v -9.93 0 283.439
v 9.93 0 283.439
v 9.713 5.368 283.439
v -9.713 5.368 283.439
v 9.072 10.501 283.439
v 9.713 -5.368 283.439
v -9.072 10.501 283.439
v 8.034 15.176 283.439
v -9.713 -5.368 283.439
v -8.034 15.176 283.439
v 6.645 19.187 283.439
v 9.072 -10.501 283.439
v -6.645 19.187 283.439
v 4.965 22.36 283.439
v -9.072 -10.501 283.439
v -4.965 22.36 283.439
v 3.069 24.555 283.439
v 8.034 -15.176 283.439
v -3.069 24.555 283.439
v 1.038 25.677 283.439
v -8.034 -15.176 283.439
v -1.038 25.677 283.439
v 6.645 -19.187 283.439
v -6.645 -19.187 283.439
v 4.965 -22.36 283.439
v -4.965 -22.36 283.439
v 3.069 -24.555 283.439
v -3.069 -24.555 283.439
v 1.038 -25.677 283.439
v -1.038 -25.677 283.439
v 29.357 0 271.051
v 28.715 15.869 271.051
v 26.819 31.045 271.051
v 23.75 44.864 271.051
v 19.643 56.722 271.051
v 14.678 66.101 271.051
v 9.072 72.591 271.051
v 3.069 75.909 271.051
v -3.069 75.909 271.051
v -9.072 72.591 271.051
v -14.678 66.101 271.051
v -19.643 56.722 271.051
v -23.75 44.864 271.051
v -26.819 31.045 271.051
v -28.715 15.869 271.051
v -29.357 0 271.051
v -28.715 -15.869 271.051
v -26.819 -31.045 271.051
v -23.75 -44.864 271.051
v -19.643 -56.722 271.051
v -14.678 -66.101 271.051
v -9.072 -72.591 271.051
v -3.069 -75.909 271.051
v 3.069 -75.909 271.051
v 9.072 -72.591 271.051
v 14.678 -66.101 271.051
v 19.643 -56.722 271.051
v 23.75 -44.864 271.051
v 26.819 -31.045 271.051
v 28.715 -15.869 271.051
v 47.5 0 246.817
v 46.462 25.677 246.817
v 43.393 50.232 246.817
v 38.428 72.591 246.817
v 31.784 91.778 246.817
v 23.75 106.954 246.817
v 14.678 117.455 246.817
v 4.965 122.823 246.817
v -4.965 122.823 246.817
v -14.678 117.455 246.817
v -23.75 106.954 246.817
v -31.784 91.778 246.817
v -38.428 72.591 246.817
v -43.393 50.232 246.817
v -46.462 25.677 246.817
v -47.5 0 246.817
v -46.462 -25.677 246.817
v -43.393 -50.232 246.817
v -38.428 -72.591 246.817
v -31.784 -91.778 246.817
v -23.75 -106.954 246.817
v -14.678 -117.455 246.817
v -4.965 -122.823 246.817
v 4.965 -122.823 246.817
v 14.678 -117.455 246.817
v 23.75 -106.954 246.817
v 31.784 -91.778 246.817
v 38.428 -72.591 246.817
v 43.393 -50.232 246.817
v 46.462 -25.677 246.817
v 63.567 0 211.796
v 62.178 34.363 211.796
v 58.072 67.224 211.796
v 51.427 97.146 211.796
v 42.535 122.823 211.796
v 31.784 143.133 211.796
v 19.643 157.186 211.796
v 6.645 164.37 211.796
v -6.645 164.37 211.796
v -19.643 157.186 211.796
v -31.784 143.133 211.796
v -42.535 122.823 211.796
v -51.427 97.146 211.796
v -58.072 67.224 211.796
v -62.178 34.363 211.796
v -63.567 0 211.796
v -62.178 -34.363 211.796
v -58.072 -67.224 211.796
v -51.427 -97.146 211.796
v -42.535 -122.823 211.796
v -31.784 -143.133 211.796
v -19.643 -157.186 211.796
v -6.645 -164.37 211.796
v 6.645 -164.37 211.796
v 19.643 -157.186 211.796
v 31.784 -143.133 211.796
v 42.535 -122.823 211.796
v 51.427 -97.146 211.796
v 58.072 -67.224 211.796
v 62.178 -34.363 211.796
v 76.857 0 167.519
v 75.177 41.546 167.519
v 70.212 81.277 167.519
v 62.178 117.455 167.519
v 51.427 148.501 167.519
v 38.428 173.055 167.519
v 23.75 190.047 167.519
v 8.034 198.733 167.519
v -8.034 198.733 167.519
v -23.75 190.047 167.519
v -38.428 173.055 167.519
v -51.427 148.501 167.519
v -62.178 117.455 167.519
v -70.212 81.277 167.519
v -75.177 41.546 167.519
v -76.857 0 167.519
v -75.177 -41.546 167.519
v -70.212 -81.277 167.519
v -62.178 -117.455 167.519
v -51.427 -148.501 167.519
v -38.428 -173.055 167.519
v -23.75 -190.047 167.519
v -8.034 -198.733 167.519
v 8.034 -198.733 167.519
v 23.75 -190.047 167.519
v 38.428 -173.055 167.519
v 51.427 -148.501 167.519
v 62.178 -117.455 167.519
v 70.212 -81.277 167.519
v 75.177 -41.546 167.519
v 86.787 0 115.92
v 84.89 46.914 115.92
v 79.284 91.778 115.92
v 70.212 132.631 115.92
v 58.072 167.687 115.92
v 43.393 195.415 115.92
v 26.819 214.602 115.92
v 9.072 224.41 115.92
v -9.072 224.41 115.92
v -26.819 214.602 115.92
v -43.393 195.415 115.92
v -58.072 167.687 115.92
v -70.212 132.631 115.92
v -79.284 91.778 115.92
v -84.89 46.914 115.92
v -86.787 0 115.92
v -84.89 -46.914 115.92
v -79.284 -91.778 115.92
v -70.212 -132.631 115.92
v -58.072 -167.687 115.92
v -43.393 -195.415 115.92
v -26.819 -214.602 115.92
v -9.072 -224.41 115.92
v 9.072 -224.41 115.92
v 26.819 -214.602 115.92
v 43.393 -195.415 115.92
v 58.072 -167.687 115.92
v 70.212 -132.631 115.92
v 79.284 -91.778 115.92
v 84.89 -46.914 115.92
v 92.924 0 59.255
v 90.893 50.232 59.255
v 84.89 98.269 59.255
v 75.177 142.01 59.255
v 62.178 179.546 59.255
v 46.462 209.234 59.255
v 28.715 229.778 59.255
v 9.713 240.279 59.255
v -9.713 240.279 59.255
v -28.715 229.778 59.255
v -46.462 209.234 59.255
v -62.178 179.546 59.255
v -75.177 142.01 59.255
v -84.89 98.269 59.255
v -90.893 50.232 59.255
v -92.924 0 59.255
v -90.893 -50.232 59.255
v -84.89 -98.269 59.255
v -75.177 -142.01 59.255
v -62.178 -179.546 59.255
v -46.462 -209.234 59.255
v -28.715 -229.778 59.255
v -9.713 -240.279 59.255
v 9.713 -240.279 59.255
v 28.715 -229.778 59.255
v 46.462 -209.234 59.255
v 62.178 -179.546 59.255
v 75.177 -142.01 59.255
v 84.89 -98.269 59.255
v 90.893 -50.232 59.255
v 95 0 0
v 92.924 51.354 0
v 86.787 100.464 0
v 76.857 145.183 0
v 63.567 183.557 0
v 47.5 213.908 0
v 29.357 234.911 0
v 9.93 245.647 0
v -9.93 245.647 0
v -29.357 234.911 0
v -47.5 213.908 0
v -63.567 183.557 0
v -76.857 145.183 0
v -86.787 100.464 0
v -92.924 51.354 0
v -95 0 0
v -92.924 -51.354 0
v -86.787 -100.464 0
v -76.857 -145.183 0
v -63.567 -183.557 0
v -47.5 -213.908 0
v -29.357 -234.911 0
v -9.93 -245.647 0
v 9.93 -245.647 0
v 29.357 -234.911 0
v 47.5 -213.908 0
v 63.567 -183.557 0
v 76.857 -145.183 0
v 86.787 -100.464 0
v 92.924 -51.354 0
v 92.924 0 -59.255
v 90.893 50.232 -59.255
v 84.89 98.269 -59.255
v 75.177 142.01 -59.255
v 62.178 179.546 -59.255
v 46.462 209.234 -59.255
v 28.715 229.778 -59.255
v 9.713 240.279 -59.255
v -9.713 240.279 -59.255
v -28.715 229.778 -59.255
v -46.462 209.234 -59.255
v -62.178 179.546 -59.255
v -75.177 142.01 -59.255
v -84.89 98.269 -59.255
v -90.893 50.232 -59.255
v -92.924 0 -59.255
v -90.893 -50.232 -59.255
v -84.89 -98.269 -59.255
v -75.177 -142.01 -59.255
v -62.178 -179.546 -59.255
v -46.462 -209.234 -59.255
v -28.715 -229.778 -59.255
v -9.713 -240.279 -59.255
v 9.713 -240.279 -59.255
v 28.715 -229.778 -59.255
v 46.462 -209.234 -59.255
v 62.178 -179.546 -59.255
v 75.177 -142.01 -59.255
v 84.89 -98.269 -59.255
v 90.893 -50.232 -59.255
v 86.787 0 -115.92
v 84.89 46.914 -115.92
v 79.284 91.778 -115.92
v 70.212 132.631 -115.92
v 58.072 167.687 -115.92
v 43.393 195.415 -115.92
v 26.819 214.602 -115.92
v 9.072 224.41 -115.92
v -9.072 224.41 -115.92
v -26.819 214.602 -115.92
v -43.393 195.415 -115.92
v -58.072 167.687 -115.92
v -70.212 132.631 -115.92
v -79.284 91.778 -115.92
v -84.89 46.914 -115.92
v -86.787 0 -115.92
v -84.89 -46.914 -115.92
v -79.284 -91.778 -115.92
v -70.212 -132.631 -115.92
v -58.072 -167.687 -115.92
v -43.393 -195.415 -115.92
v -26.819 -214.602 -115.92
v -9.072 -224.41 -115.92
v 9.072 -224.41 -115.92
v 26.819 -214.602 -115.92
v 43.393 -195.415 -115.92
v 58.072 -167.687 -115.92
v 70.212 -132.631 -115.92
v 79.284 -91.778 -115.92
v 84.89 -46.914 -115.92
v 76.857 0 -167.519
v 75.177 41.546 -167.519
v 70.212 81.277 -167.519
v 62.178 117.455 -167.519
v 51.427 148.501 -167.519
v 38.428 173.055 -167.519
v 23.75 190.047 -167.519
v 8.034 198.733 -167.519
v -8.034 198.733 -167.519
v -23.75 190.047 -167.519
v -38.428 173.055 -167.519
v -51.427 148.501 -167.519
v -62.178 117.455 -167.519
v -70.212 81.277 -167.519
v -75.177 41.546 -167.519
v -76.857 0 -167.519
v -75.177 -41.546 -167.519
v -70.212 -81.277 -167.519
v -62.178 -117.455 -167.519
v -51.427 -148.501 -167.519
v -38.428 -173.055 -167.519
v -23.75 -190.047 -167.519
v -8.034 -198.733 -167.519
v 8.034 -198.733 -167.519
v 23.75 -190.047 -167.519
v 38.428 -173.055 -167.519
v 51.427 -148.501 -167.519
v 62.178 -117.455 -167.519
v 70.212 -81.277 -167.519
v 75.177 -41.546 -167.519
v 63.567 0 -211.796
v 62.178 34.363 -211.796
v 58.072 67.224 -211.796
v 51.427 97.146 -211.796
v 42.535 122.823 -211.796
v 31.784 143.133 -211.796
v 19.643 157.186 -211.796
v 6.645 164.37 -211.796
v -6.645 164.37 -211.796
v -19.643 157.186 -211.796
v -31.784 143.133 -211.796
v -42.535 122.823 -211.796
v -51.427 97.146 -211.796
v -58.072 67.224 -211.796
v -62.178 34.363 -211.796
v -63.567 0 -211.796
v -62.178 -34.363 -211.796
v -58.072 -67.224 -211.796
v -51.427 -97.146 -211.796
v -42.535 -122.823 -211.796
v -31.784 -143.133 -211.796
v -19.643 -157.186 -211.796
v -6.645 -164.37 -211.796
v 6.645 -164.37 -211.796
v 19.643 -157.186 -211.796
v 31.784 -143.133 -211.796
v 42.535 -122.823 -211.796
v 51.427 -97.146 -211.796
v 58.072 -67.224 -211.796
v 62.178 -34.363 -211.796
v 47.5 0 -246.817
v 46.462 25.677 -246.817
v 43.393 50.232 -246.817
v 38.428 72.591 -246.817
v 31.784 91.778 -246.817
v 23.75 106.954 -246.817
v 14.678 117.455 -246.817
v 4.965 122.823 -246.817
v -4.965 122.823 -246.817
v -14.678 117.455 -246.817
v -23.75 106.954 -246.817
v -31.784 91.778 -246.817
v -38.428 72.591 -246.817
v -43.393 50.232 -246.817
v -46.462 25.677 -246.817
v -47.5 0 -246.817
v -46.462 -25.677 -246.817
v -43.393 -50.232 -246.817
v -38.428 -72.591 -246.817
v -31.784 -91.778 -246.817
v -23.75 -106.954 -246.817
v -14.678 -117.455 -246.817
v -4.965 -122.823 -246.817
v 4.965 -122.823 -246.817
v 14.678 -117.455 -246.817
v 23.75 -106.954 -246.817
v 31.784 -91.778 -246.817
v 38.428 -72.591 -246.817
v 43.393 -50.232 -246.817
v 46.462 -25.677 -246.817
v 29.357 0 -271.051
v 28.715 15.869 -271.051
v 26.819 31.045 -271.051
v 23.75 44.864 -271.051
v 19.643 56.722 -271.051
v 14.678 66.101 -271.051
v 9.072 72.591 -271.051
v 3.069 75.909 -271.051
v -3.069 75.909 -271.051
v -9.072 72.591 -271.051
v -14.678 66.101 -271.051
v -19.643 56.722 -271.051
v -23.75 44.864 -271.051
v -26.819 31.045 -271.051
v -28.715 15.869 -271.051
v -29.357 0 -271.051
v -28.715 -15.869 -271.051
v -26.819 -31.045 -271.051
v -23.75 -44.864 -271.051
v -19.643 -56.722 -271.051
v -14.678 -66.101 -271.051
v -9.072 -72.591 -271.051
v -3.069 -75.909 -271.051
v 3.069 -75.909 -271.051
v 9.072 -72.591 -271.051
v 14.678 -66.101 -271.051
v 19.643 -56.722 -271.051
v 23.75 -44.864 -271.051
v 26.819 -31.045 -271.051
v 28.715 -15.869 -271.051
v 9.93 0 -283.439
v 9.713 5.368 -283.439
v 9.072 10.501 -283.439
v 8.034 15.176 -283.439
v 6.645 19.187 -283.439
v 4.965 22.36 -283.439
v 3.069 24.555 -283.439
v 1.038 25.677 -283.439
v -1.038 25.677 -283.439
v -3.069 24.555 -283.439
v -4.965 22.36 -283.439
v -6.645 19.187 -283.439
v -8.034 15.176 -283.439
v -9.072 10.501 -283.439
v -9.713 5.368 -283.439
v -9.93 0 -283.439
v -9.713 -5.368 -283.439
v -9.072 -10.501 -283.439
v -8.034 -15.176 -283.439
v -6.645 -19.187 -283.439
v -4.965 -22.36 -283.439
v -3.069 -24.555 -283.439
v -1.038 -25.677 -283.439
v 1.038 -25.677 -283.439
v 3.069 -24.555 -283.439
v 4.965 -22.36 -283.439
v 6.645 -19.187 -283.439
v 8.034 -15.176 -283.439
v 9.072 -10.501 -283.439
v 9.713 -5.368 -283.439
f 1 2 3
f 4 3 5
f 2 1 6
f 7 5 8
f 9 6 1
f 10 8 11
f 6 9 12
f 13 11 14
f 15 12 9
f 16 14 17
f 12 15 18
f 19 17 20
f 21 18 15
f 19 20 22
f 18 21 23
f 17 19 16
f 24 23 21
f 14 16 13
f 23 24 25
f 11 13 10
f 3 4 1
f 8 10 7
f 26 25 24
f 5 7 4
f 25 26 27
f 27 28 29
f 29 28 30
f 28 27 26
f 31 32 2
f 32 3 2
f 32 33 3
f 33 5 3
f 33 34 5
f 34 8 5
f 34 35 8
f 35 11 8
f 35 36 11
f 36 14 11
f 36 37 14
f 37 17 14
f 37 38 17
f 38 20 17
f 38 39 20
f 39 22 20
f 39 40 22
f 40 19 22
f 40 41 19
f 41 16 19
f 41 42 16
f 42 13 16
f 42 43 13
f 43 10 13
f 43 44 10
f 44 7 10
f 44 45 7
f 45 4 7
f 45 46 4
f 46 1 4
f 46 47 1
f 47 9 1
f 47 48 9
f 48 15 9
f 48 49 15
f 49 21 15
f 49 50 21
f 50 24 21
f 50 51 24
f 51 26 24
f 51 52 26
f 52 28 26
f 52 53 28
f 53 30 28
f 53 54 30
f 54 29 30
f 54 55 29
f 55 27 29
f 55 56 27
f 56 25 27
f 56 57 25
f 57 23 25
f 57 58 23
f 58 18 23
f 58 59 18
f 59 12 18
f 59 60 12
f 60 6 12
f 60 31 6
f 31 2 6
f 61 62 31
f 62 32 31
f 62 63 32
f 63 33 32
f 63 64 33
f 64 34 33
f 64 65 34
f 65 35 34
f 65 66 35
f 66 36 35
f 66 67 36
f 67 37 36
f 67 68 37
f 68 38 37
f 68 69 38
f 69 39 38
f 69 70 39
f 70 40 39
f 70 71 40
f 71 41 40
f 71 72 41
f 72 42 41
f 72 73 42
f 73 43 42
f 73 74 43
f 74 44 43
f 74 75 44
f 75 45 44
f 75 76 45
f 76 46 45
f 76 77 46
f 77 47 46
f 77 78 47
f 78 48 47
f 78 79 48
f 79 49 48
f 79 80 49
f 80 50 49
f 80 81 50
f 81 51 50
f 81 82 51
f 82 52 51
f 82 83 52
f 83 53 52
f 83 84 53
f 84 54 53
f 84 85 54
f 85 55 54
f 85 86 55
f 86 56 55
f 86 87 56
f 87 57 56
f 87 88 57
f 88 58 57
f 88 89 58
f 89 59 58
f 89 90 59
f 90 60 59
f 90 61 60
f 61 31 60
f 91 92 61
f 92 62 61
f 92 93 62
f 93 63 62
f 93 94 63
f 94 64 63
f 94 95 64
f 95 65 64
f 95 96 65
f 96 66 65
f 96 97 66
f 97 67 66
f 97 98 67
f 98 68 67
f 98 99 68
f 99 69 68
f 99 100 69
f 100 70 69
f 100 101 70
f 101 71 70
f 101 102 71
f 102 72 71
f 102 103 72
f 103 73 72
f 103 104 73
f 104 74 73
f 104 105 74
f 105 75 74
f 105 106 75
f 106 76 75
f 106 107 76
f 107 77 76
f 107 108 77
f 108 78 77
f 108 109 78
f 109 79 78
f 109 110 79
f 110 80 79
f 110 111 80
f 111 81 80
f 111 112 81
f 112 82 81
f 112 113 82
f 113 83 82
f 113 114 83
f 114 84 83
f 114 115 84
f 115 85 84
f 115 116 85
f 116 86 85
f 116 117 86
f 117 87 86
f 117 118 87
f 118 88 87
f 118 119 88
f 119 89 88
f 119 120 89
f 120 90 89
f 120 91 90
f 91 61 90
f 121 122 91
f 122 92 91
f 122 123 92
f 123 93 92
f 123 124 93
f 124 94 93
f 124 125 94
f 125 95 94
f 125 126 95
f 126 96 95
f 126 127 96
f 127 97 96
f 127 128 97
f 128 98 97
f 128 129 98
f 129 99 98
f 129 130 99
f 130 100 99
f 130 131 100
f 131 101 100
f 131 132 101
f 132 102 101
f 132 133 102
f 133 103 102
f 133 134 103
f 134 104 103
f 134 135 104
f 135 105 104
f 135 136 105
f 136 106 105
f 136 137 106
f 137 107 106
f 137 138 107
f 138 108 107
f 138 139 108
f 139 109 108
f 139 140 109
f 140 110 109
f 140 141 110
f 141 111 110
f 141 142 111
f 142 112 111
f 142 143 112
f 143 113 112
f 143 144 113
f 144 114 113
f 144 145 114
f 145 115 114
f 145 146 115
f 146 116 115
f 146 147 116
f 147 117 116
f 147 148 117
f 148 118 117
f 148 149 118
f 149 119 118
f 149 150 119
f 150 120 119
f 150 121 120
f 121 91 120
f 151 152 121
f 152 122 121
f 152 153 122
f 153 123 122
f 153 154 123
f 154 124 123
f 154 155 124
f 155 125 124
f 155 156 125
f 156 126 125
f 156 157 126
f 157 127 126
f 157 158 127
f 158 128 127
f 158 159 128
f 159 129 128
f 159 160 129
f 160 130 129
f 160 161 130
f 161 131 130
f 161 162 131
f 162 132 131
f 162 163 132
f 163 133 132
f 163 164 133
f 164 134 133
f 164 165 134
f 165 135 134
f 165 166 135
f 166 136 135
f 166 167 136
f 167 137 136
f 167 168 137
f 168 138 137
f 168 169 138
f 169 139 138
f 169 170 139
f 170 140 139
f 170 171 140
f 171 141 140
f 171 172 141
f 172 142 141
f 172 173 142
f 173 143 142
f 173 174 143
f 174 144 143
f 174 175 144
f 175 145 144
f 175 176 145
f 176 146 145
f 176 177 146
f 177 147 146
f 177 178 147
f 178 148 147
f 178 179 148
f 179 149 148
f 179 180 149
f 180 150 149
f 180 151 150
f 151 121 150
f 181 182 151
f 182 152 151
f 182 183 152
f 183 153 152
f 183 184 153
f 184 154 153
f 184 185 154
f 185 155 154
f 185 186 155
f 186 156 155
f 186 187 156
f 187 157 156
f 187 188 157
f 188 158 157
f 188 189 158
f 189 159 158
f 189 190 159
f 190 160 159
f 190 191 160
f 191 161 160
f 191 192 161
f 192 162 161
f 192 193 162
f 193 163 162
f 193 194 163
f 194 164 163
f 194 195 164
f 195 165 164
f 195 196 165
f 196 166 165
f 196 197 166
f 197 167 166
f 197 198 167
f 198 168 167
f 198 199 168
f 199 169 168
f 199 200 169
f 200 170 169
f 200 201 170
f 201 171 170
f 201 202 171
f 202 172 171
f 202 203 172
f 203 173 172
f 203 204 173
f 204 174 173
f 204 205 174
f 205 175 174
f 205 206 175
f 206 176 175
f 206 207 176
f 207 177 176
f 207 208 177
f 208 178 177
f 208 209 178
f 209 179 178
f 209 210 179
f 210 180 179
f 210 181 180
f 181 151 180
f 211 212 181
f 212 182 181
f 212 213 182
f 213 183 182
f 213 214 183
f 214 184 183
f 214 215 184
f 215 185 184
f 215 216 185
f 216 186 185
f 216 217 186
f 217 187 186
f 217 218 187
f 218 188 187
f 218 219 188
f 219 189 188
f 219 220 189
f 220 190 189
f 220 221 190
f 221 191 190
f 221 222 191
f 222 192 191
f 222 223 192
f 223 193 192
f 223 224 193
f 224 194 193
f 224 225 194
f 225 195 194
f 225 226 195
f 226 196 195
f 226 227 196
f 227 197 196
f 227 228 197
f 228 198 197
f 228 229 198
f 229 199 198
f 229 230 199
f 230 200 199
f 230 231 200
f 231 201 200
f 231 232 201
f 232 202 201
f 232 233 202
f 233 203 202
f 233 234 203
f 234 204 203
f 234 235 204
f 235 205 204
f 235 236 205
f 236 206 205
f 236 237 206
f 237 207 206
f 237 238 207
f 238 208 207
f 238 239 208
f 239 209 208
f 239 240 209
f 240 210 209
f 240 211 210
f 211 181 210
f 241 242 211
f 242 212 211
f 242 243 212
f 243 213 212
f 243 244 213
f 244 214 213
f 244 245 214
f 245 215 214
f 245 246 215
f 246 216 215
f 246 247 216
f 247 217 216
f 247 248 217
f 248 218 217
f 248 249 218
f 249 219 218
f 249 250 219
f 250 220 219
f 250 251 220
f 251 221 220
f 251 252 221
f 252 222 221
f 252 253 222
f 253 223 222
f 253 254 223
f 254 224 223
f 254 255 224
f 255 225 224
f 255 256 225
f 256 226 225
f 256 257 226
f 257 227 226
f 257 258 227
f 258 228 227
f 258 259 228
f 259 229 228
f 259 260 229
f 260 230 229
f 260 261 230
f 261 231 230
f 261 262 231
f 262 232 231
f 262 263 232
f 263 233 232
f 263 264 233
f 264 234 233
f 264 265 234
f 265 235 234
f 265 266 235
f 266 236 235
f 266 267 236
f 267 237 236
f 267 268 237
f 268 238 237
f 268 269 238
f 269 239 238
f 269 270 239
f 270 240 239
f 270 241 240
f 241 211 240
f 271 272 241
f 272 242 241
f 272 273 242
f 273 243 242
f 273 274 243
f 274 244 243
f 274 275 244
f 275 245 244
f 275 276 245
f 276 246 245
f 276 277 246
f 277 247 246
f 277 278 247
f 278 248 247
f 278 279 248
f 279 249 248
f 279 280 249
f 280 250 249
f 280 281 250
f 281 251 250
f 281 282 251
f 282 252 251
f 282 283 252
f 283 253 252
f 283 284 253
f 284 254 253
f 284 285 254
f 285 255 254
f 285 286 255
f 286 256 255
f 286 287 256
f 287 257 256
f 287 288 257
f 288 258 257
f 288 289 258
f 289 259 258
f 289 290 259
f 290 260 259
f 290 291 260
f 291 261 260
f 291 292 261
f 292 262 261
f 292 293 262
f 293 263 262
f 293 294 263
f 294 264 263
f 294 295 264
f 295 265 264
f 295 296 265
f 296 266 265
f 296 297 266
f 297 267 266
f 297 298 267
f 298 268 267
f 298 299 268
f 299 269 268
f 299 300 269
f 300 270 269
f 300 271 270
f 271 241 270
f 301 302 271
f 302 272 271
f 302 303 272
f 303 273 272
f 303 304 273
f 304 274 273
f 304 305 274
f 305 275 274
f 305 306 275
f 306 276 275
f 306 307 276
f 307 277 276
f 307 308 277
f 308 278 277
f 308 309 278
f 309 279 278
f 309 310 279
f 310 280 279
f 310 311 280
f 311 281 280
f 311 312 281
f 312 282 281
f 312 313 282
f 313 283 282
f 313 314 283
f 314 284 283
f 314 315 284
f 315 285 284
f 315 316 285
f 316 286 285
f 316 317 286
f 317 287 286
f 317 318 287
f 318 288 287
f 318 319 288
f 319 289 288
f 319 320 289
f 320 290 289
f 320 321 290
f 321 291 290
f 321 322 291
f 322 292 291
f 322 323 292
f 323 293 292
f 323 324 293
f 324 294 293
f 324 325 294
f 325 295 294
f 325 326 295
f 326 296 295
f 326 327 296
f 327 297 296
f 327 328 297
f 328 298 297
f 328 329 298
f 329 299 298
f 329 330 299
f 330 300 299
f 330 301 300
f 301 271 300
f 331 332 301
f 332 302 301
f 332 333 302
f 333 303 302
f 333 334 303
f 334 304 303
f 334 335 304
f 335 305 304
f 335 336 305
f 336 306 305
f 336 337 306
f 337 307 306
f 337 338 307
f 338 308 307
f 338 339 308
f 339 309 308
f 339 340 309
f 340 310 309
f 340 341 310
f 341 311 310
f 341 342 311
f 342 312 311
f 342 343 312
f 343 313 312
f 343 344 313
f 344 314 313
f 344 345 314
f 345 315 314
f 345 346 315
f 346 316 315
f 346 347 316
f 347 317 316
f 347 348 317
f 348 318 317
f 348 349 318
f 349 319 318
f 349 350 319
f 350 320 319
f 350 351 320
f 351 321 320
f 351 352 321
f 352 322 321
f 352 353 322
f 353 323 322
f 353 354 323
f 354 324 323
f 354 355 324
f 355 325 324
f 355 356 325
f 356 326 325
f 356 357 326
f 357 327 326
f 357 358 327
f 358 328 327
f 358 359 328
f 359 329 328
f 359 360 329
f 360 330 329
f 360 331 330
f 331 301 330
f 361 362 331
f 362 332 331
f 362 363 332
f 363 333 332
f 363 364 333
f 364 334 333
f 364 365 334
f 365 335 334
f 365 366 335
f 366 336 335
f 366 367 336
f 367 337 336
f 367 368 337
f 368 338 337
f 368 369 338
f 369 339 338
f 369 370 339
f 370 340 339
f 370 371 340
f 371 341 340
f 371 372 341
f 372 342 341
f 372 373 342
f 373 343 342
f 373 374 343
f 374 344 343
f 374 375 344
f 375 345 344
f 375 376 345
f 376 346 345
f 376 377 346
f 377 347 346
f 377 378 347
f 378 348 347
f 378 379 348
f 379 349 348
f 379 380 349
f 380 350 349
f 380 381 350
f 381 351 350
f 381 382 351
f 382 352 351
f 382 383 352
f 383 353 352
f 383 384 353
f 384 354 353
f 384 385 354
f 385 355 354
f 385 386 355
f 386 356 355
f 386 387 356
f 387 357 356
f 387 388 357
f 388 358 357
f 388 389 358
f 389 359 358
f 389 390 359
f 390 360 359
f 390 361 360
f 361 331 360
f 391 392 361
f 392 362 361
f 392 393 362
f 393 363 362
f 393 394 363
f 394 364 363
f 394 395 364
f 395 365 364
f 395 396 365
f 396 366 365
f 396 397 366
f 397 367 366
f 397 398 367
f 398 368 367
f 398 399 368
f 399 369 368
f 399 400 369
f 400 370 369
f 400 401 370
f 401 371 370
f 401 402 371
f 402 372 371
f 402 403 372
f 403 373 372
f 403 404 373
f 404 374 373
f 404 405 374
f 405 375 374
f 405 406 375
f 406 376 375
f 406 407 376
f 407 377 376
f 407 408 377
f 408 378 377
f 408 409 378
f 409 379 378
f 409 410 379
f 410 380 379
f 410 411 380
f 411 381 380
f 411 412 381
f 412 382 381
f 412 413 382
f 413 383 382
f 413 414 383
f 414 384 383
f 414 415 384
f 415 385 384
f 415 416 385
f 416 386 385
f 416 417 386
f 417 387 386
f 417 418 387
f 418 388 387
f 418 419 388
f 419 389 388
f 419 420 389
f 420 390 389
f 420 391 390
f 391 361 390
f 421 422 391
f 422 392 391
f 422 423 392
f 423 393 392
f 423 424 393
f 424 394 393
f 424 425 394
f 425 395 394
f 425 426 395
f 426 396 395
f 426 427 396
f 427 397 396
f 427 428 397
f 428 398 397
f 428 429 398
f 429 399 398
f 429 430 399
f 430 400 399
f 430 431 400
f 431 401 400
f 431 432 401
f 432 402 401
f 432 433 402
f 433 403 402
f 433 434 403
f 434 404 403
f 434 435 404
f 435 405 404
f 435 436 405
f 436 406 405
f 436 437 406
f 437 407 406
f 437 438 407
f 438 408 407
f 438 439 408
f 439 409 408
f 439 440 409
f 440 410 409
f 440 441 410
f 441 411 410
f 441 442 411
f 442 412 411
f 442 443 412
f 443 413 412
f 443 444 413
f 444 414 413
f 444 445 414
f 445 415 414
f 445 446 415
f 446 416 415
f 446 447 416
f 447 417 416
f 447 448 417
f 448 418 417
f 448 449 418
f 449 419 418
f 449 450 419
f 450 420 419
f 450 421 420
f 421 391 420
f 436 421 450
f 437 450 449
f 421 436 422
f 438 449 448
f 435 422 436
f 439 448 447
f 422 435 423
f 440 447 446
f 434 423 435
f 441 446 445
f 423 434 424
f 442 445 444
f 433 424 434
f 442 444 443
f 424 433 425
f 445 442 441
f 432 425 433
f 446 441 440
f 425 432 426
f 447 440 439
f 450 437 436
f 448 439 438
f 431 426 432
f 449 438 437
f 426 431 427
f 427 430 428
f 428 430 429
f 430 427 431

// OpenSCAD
// Generated by SolidPython 1.0.1 on 2020-07-29 00:46:46


scale(v = [5, 13, 15]) {
	sphere(r = 19);
}
/***********************************************
*********      SolidPython code:      **********
************************************************
 
# import packages: SolidPython
from solid import *
from solid.utils import *
from itertools import chain, combinations, permutations


class Resize:

    def __init__(self, scad_file):
        self.scad_file = scad_file
        #self.scad_file = import_scad(scad_file)
        # cone/cylinder param:
        self.r1 = 0
        self.r2 = 0
        self.h = 0
        # rectangular prism param:
        self.w = 0
        self.l = 0
        # ellipse param:
        self.r = 0

    # import OpenScad code (file name corresponds to shape)


    # classify shape + parameters
    def assign(self, param1, param2, param3):
        if self.scad_file == 'cone.scad':
            self.r1 = param1
            self.r2 = param2
            self.h = param3
        elif self.scad_file == 'cylinder.scad':
            self.r1 = param1
            self.r2 = param2
            self.h = param3
        elif self.scad_file == 'rectangularPrism.scad':
            self.h = param1
            self.l = param2
            self.w = param3
        else:
            self.r = param1
            self.h = param2

    # resize parameters
    def iterate(self):
        x = range(3, 20, 2)
        i = 1
        if self.scad_file == 'cone.scad':
            tempList = list(permutations(x, 2))
            for temp in tempList:
                param1 = temp[0]
                param2 = temp[1]
                filepath = 'produced_scad_files/' + 'cone' + str(param1) + '_' + str(param2) + '_' + '.scad'
                scad_render_to_file(cylinder(h=param1, r1=param2, r2=0), filepath)

        elif self.scad_file == 'cylinder.scad':
            tempList = list(permutations(x, 3))
            for temp in tempList:
                param1 = temp[0]
                param2 = temp[1]
                filepath = 'produced_scad_files/' + 'cylinder' + str(param1) + '_' + str(param2) + '_' + '.scad'
                scad_render_to_file(cylinder(h=param1, r1=param2, r2=param2), filepath)

        elif self.scad_file == 'rectangularPrism.scad':
            tempList = list(permutations(x, 3))
            for temp in tempList:
                param1 = temp[0]
                param2 = temp[1]
                param3 = temp[2]
                filepath = 'produced_scad_files/' + 'rectangularPrism' + str(param1) + '_' + str(param2) + '_' + str(
                    param3) + '.scad'
                scad_render_to_file(cube(size=(param1, param2, param3)), filepath)

        elif self.scad_file == 'ellipse.scad':
            tempList = list(permutations(x, 4))
            for temp in tempList:
                param1 = temp[0]
                param2 = temp[1]
                param3 = temp[2]
                param4 = temp[3]
                filepath = 'produced_scad_files/' + 'ellipse' + str(param1) + '_' + str(param2) + '_' + str(param3) + '_' + str(param4) + '.scad'
                scad_render_to_file(scale([param1, param2, param3])(sphere(r=param4)), filepath)

    def render_to_scadfile(self):
        scad_render_to_file(scad, 'example.scad') 
 
************************************************/
